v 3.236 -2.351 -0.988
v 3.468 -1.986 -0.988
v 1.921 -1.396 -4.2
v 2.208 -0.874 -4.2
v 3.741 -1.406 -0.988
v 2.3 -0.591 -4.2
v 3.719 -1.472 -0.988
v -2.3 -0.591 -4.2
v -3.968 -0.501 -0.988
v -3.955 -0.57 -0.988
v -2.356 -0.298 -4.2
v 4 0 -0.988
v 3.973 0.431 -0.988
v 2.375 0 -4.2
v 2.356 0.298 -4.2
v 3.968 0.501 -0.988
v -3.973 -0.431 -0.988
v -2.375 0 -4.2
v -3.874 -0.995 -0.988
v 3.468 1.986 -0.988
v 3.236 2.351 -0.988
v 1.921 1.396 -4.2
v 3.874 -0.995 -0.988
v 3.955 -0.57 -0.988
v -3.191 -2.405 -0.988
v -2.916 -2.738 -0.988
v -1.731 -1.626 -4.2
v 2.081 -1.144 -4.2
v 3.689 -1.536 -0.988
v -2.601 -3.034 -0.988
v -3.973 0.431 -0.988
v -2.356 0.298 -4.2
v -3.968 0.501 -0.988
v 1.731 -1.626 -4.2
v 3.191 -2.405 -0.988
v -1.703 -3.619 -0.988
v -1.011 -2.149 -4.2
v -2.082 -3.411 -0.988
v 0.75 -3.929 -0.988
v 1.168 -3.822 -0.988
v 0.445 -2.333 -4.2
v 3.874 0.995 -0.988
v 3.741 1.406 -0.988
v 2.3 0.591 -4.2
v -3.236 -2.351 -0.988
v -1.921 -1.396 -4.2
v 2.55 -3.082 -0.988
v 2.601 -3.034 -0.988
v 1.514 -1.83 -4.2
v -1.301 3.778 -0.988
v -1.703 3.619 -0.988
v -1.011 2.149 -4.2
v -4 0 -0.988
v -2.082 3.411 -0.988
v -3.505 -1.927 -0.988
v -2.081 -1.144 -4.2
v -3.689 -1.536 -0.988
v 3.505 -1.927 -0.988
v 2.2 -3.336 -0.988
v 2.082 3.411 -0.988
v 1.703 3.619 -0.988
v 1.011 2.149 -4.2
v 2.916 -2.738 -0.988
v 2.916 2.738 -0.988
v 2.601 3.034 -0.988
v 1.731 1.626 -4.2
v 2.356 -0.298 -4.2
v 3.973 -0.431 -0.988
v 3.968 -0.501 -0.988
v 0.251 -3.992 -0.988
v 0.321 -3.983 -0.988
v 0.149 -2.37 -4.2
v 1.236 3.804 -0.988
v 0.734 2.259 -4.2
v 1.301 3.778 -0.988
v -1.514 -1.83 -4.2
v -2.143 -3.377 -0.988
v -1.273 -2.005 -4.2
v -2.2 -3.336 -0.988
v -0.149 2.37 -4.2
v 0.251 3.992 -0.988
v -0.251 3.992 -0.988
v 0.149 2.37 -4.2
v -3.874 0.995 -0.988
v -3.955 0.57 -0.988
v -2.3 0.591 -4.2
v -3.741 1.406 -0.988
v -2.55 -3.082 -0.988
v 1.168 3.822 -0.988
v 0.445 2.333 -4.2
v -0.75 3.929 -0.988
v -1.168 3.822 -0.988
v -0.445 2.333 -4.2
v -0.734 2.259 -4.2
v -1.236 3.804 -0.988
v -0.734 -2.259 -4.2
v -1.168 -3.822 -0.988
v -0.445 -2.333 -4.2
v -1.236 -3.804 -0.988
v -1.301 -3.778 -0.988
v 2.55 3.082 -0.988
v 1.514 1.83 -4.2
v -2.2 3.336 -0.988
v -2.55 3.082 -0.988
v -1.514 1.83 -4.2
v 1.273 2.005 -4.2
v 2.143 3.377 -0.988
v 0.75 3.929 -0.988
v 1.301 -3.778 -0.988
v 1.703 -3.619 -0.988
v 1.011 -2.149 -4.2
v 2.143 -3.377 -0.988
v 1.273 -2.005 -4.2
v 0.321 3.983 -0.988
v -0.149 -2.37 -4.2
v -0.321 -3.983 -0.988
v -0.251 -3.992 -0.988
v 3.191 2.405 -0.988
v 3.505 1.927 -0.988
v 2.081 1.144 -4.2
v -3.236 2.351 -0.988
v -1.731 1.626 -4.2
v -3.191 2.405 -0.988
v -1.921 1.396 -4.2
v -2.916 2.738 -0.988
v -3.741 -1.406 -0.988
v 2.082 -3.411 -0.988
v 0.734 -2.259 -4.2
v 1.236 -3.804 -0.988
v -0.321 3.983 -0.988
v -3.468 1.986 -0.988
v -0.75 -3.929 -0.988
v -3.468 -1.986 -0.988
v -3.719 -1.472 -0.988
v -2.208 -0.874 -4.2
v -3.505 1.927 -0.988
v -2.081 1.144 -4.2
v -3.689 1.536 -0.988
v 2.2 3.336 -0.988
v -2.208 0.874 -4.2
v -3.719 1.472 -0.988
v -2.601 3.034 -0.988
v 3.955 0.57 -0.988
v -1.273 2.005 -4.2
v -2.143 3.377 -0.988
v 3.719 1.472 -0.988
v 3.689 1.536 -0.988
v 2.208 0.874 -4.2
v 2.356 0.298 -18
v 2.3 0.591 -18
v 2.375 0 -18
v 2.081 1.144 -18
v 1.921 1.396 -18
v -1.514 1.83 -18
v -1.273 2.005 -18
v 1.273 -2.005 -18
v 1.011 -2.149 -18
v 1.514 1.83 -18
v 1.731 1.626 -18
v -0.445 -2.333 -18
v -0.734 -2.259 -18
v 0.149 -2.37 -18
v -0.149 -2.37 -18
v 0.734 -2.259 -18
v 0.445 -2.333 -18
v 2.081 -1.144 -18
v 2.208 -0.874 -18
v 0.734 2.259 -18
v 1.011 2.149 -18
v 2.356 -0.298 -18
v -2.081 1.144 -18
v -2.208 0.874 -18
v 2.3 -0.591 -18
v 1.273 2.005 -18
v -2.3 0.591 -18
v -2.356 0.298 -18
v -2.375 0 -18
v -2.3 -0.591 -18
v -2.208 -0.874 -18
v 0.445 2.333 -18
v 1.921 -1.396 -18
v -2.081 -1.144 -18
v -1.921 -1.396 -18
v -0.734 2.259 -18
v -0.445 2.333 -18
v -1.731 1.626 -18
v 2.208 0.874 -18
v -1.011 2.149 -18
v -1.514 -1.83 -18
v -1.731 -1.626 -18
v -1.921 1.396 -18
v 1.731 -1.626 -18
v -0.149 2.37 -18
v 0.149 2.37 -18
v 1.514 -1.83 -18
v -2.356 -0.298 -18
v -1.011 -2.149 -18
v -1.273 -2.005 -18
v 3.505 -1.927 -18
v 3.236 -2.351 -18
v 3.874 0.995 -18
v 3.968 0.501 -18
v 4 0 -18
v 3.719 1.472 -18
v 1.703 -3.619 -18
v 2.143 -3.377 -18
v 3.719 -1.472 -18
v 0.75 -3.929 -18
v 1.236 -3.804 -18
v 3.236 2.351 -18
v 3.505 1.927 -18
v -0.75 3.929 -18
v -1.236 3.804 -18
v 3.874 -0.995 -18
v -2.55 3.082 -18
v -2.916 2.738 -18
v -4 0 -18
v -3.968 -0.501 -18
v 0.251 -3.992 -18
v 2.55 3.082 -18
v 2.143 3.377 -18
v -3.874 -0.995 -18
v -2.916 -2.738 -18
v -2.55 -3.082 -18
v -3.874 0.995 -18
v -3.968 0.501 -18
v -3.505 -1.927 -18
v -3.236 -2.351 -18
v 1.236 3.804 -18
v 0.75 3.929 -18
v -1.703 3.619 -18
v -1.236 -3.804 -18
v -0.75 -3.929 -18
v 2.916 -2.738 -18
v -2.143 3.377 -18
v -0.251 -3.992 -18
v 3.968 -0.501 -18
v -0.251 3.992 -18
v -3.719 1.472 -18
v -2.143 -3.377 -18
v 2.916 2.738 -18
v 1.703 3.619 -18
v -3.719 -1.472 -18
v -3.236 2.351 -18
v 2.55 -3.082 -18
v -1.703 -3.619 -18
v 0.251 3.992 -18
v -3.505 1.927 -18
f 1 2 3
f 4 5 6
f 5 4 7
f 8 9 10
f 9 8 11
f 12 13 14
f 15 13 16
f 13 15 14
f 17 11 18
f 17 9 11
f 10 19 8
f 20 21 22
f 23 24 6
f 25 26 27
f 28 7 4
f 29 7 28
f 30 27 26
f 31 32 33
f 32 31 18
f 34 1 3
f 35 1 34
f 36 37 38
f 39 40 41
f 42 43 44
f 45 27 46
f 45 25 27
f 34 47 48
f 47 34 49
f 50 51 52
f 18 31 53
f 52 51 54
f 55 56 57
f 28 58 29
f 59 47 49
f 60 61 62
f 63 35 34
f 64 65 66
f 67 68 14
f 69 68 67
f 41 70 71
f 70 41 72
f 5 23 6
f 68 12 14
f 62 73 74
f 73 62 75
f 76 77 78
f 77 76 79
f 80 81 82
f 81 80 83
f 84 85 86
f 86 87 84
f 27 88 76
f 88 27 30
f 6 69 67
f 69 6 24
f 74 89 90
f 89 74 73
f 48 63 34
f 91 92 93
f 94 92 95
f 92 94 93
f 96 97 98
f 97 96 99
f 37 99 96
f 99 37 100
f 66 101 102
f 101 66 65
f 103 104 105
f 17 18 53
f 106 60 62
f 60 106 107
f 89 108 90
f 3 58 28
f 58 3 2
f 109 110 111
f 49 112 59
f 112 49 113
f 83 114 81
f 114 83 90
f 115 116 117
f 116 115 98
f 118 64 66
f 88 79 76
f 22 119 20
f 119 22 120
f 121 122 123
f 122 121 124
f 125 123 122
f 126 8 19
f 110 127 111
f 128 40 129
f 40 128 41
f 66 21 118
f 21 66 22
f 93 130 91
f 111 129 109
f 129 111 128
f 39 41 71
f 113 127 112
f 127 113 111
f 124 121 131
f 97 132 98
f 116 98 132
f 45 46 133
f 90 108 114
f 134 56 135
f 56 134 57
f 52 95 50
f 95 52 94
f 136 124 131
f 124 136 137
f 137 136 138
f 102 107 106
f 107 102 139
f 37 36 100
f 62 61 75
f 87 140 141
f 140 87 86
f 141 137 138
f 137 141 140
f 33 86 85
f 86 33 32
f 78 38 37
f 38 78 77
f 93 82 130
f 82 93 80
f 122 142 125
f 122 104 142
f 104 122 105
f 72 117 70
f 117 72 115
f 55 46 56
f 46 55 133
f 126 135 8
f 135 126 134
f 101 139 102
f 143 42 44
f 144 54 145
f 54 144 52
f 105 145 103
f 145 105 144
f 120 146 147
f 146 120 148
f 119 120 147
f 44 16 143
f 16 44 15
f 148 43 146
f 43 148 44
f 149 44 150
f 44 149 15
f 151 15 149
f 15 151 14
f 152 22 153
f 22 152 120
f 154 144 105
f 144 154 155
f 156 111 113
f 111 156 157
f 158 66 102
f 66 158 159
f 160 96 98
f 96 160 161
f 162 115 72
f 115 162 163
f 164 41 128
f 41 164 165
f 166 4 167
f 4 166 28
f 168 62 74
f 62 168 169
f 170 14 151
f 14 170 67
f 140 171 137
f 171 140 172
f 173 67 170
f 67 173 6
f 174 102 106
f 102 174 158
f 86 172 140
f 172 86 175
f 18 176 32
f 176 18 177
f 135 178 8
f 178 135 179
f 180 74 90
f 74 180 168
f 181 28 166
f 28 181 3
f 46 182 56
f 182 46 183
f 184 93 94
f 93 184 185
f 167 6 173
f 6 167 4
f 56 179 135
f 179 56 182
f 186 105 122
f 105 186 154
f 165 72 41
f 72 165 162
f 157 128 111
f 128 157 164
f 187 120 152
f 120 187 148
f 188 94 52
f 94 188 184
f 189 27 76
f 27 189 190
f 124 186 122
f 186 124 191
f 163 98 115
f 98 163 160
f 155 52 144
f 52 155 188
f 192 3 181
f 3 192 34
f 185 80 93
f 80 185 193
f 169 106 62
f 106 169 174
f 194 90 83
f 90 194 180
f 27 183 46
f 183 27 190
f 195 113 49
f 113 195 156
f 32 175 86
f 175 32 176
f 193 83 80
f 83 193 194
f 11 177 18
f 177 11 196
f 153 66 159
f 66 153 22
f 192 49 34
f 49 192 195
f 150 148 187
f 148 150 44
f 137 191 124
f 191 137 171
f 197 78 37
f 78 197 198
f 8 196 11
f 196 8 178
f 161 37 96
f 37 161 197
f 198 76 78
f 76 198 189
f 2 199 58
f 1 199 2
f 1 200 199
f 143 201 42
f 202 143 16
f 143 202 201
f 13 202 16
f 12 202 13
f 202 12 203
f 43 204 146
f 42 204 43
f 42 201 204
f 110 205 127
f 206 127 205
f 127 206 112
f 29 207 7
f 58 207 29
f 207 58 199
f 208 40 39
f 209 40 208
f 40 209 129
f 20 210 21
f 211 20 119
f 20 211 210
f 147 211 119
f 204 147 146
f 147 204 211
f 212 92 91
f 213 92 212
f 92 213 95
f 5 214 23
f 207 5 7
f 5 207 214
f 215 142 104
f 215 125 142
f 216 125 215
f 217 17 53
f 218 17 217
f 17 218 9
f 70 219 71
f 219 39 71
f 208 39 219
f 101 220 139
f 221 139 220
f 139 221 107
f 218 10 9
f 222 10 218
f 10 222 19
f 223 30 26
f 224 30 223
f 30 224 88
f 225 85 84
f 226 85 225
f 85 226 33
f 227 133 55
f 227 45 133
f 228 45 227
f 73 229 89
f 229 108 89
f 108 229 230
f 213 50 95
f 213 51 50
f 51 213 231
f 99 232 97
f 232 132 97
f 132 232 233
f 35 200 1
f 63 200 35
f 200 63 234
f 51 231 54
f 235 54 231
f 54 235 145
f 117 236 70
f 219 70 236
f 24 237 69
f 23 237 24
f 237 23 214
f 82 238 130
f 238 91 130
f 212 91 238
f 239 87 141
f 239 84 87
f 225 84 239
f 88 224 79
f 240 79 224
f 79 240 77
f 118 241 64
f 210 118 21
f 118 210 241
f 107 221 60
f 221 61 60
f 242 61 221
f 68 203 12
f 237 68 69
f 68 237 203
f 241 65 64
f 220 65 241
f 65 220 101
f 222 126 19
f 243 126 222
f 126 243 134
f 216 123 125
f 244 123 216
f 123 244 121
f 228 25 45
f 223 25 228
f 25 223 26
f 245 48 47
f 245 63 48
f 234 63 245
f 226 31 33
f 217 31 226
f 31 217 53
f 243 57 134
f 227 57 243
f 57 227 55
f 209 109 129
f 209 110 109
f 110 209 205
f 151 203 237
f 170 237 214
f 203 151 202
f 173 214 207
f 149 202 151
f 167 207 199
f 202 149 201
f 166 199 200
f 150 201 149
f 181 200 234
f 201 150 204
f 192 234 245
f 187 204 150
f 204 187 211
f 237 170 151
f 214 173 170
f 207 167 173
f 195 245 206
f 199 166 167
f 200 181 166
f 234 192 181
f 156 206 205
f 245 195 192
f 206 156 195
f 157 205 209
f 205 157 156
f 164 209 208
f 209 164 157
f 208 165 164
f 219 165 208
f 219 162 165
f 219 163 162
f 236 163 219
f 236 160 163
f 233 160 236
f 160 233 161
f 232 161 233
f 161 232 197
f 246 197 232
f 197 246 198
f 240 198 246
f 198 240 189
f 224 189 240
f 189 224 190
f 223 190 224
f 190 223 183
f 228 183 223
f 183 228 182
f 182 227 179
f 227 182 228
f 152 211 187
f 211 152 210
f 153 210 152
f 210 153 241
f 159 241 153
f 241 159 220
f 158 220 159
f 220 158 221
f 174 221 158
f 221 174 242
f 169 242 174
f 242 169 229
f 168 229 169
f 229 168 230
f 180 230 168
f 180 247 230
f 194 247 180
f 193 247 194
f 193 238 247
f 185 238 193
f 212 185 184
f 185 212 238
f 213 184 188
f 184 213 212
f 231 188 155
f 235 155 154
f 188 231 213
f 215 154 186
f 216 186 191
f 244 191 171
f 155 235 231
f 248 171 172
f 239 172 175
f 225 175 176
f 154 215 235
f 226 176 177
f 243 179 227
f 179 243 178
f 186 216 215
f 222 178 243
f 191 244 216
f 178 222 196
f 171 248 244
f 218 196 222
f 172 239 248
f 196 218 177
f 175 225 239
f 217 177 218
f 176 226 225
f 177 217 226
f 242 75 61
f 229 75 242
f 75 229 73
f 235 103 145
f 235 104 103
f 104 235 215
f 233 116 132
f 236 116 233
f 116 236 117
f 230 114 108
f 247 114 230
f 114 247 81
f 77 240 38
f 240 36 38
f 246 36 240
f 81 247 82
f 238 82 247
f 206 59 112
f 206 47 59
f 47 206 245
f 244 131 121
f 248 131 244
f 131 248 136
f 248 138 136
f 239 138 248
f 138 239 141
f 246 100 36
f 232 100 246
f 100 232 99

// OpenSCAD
$fn = 50;

difference() {
	union() {
		translate(v = [0, 0, -18.0]) {
			cylinder(h = 18, r = 4.0);
		}
	}
	union() {
		translate(v = [0, 0, 0]) {
			rotate(a = [0, 0, 0]) {
				difference() {
					union() {
						translate(v = [0, 0, -21.0]) {
							cylinder(h = 21, r = 2.25);
						}
						translate(v = [0, 0, -4.2]) {
							cylinder(h = 4.2, r1 = 2.375, r2 = 4.5);
						}
						translate(v = [0, 0, -21.0]) {
							cylinder(h = 21, r = 2.375);
						}
						translate(v = [0, 0, -21.0]) {
							cylinder(h = 21, r = 2.25);
						}
					}
					union();
				}
			}
		}
	}
}
